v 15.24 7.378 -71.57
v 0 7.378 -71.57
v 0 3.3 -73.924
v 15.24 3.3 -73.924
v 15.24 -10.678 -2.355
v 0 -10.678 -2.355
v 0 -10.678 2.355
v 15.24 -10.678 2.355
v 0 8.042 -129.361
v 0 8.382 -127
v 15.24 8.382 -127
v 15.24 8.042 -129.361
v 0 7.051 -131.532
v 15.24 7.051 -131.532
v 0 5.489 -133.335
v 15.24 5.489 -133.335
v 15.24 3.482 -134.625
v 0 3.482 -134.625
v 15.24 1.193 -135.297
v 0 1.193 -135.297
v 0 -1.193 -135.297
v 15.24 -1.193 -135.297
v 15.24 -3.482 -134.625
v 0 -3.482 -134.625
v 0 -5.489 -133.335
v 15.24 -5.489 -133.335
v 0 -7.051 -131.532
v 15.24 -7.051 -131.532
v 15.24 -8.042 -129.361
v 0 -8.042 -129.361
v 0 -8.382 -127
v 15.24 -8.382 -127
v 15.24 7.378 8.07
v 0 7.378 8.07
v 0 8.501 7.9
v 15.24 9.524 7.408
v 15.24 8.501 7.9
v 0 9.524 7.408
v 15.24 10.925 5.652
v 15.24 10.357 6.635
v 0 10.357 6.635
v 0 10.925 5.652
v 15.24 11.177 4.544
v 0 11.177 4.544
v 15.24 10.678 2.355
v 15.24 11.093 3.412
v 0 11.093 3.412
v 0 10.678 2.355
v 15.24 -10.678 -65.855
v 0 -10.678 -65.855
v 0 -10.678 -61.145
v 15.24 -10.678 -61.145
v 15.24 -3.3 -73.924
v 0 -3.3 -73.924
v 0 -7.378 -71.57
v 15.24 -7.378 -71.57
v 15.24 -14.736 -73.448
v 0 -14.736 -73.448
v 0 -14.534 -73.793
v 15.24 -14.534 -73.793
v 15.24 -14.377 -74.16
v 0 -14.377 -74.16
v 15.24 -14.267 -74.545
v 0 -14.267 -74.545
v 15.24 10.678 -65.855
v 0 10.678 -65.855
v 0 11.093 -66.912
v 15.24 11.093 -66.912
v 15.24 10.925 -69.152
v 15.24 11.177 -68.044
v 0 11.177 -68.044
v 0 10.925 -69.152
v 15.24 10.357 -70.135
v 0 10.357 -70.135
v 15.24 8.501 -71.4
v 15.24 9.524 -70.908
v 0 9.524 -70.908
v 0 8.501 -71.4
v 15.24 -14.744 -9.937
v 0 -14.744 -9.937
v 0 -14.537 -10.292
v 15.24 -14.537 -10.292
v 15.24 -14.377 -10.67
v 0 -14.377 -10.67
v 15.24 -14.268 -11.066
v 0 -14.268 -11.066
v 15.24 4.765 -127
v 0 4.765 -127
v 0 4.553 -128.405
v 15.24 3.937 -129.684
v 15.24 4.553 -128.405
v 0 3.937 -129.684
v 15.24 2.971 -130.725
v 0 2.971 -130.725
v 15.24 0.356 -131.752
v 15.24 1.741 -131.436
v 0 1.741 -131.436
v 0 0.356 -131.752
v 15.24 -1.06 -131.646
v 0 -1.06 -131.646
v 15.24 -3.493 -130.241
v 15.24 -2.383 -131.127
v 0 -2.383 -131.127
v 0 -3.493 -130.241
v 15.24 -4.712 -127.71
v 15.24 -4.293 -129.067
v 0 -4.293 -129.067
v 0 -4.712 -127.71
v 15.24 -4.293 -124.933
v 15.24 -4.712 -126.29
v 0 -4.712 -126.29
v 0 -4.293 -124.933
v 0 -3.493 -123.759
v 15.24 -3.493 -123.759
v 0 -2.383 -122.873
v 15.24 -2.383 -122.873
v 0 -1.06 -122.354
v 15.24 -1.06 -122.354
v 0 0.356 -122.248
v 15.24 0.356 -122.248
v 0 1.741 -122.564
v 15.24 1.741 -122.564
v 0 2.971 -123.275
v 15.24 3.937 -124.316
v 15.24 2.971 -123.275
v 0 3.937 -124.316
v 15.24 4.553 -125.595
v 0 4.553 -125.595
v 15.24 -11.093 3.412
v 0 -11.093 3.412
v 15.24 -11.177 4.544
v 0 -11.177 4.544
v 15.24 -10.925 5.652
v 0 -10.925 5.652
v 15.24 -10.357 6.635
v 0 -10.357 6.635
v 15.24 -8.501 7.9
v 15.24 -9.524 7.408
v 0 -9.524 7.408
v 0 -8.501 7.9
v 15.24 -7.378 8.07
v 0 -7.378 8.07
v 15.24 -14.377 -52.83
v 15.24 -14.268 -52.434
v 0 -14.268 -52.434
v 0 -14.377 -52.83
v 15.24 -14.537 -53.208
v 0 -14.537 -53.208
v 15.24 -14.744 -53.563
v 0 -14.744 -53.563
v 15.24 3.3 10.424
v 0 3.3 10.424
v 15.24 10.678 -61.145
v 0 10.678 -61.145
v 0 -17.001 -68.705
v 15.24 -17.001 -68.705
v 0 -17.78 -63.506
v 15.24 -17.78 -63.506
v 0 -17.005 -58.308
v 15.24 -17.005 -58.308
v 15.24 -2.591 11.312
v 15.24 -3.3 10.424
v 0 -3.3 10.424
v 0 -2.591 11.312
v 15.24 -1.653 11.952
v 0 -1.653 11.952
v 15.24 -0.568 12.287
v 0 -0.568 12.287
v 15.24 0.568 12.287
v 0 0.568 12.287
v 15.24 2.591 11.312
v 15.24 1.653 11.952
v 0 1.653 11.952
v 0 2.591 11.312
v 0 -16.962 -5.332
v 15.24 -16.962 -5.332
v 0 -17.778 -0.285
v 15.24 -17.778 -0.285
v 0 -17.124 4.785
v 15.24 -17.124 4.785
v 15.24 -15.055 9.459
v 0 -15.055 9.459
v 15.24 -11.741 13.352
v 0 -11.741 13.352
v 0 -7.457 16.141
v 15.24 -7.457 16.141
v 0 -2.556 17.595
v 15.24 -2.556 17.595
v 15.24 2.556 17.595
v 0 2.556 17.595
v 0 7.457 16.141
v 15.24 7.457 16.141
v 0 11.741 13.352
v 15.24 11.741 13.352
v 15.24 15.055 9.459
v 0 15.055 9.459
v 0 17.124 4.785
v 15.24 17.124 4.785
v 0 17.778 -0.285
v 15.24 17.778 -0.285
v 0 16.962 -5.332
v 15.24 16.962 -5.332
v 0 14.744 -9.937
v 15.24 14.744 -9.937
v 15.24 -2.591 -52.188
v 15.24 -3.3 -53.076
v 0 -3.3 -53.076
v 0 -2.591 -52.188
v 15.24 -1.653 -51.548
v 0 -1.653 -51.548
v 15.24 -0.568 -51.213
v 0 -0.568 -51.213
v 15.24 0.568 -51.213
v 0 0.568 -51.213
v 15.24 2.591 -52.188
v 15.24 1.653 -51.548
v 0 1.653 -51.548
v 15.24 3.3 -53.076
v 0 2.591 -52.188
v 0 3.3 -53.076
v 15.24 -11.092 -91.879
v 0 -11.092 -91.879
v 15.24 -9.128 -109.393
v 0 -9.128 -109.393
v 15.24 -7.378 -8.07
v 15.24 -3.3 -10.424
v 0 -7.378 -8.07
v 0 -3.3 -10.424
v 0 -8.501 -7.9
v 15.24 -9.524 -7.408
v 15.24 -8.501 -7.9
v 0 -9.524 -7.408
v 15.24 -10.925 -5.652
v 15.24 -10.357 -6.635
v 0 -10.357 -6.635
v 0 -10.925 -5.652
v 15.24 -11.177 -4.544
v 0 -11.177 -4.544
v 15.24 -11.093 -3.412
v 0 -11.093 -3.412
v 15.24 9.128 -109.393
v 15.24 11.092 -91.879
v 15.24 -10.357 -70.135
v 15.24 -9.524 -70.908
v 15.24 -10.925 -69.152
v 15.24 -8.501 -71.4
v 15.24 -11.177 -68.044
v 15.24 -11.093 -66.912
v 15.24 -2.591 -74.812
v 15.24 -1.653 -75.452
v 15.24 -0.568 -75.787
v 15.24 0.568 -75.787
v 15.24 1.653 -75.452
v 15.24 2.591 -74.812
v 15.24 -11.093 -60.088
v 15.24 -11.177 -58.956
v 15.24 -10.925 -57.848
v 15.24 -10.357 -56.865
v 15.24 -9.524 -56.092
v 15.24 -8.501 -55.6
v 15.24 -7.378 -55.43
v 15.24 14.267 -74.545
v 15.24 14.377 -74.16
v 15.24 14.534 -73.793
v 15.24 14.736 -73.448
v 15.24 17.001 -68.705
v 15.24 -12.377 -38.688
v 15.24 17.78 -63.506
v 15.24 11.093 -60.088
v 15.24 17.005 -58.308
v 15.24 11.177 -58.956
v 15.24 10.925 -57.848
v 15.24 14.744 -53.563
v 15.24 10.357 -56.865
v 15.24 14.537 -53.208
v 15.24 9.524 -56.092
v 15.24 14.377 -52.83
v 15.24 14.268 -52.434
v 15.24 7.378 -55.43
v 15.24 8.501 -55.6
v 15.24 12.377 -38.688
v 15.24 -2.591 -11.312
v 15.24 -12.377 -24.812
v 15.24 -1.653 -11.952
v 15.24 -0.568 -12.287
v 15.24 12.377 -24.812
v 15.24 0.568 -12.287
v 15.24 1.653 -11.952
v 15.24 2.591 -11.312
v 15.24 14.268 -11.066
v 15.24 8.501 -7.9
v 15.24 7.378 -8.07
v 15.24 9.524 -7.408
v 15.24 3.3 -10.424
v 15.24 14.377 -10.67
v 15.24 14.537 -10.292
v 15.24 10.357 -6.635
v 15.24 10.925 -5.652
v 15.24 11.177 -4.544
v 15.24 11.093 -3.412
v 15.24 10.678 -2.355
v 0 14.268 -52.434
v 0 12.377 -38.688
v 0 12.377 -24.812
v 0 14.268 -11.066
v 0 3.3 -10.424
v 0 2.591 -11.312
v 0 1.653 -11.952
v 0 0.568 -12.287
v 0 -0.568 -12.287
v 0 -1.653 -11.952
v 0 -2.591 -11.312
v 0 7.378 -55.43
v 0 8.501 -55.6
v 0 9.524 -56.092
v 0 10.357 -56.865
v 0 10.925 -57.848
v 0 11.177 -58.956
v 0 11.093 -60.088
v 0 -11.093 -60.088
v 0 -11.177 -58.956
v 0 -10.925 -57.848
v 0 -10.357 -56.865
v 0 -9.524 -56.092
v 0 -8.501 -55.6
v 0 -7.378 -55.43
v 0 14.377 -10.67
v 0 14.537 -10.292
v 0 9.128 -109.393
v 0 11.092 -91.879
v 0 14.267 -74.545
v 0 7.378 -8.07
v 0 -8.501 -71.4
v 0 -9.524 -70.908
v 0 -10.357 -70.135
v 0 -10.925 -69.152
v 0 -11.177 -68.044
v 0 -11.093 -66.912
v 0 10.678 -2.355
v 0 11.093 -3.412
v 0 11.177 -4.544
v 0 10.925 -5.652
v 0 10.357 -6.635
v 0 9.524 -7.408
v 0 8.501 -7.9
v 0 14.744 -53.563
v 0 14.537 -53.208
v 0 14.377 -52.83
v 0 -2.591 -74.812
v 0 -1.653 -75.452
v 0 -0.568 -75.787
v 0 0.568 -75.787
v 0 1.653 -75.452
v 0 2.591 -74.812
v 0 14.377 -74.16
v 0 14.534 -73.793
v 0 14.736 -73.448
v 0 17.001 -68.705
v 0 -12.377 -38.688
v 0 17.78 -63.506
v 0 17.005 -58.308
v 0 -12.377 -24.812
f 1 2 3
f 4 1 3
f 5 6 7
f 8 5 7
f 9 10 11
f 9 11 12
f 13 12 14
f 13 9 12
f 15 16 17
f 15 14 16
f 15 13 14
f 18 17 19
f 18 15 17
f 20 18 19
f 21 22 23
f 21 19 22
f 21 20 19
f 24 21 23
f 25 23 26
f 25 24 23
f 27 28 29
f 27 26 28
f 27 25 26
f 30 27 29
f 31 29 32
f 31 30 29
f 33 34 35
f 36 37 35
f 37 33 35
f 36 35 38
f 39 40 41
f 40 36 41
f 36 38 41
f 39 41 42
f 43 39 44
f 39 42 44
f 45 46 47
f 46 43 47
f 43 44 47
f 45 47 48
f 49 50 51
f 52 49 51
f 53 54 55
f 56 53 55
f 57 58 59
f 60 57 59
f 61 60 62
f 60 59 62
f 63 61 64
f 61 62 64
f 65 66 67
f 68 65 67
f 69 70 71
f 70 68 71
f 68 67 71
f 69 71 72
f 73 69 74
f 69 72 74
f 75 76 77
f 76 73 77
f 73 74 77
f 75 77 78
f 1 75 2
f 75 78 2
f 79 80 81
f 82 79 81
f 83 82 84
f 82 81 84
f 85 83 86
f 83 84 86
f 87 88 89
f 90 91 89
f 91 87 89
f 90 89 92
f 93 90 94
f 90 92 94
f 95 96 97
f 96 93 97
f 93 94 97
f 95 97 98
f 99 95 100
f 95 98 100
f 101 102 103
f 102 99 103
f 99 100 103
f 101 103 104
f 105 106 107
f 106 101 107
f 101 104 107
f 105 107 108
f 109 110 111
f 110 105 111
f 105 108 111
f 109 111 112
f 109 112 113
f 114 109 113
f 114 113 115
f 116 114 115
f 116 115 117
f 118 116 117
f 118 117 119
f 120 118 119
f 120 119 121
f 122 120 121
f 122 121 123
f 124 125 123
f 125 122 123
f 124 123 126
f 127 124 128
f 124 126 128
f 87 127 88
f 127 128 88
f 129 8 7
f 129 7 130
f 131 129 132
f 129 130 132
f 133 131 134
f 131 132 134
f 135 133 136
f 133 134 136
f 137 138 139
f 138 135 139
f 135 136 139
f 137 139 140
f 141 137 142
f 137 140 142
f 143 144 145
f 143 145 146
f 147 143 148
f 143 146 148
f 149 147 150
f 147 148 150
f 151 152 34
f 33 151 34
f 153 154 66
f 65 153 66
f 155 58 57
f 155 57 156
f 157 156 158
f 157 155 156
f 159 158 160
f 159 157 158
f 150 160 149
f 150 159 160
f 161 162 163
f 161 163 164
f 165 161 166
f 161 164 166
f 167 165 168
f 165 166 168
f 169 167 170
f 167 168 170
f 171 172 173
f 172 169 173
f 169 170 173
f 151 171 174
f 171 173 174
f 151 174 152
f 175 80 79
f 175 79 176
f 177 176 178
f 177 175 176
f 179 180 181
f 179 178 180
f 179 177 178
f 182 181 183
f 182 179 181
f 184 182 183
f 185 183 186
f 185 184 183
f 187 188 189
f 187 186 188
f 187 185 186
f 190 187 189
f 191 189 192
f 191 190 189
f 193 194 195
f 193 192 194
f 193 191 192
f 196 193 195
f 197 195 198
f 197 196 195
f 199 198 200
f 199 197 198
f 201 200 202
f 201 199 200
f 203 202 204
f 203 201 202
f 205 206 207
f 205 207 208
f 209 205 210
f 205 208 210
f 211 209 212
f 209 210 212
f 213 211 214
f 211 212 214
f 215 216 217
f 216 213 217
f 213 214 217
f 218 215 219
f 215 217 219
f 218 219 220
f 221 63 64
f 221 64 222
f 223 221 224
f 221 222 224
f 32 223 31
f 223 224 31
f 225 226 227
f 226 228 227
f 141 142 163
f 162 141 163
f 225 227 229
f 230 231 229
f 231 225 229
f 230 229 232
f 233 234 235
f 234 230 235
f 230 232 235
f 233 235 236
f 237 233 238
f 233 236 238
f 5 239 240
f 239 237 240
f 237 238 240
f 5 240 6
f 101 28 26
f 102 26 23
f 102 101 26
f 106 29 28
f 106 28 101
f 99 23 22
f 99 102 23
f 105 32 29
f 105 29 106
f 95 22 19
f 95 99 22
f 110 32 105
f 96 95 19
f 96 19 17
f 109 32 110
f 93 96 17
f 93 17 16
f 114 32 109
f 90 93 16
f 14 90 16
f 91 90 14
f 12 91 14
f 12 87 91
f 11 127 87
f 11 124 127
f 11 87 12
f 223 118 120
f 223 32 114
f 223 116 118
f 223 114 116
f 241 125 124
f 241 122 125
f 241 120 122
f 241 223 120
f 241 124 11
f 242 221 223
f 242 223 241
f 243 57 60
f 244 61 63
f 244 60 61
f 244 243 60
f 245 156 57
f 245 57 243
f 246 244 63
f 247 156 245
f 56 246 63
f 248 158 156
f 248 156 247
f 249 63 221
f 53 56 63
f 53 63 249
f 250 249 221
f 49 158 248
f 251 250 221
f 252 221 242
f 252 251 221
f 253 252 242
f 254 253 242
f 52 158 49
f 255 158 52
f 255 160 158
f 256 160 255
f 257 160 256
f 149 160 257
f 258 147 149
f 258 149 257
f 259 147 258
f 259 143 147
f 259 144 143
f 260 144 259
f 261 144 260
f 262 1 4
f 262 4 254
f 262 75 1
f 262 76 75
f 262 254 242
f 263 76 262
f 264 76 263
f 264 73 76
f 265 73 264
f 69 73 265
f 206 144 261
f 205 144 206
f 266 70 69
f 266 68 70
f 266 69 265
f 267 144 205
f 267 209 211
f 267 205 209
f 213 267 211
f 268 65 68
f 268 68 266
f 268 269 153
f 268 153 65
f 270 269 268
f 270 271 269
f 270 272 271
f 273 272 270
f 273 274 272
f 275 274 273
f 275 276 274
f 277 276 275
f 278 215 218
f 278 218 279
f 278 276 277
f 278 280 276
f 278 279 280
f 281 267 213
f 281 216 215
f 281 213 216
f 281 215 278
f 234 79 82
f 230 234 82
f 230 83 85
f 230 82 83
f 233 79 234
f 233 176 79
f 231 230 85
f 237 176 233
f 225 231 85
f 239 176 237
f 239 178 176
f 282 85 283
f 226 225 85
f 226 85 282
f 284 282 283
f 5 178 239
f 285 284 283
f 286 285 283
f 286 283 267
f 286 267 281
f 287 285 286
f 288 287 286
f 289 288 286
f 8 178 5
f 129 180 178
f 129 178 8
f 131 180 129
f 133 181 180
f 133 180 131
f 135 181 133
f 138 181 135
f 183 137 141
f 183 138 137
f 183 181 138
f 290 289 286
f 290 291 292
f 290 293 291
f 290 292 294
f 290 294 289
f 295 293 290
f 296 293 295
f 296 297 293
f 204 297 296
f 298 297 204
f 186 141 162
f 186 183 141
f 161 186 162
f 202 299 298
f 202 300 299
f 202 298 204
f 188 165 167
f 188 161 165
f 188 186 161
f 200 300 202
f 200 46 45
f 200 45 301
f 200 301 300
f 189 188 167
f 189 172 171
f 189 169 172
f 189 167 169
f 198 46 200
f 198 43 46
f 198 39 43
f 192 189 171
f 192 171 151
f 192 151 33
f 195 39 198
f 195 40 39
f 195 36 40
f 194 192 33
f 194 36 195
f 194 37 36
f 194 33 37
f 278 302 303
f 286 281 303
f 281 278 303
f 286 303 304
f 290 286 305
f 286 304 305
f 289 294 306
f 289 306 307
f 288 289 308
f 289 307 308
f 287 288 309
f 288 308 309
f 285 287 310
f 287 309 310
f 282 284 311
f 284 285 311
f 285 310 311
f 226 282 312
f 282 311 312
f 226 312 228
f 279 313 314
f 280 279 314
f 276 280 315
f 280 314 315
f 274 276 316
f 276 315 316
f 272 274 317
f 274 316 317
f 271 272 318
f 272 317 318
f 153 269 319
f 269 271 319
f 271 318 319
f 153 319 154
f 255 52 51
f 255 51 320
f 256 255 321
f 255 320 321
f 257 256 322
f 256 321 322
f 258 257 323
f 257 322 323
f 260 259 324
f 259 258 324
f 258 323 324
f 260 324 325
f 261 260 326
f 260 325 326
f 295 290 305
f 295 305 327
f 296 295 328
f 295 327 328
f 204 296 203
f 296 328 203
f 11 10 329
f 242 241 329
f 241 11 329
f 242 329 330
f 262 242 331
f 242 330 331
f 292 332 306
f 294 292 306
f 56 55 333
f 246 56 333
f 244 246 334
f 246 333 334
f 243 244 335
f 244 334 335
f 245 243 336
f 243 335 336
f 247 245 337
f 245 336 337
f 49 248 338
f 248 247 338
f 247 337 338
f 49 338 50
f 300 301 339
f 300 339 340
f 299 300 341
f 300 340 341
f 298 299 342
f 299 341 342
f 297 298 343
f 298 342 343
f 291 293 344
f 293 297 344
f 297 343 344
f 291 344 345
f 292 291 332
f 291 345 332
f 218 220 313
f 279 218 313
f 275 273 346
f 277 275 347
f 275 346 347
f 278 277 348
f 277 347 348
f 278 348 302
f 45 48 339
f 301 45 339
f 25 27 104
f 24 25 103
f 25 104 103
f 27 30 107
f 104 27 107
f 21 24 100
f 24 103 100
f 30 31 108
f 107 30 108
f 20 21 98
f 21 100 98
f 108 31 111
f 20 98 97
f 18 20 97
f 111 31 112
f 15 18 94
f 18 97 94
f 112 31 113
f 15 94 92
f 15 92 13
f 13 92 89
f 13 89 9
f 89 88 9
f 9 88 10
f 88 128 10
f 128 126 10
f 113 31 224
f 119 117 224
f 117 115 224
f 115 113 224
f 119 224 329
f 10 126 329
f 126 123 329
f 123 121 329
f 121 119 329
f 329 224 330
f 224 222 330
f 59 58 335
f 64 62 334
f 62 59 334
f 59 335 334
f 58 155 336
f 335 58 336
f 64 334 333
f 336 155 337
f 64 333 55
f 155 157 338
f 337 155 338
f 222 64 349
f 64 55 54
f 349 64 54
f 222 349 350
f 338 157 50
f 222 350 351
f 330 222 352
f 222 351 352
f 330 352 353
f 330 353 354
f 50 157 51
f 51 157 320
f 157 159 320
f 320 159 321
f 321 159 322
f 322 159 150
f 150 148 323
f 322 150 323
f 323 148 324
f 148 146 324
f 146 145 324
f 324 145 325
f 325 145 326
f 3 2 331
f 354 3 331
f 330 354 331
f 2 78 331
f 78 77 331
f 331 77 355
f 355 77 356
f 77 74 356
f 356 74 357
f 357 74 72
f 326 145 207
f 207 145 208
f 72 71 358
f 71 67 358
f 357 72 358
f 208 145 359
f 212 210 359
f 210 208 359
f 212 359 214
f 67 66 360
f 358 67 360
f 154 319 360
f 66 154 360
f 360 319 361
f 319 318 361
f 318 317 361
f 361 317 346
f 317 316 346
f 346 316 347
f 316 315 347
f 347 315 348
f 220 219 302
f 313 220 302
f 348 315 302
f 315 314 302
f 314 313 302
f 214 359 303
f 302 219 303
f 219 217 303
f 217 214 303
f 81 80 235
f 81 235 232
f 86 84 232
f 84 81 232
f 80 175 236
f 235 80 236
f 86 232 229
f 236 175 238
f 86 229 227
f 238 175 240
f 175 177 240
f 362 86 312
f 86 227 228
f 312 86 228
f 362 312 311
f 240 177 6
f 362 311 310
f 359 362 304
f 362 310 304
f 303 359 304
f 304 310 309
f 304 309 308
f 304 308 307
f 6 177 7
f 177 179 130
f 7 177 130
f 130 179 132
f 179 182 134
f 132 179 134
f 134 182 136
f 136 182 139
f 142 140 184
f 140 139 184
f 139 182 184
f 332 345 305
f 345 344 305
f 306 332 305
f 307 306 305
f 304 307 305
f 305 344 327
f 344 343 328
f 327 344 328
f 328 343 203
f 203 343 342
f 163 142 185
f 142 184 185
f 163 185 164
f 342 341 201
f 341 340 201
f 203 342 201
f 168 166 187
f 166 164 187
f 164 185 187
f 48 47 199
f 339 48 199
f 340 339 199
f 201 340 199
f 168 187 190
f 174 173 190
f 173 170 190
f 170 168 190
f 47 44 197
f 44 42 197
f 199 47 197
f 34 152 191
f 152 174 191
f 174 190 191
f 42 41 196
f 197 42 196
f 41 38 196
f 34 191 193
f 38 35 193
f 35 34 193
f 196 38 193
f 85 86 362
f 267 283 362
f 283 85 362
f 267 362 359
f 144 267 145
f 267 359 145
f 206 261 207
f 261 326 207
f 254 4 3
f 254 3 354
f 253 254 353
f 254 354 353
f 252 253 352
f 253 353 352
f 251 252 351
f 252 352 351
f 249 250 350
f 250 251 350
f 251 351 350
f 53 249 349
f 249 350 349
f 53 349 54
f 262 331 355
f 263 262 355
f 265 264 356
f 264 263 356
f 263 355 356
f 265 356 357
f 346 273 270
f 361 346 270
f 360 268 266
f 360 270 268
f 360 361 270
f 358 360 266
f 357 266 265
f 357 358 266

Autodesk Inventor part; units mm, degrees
ref_plane "YZ Plane" through (0, 0, 0) normal (1, 0, 0) x (0, 1, 0)
ref_plane "XZ Plane" through (0, 0, 0) normal (0, 1, 0) x (-1, 0, 0)
ref_plane "XY Plane" through (0, 0, 0) normal (0, 0, 1) x (1, 0, 0)
sketch "Sketch1" plane through (0, 0, 0) normal (1, 0, 0) x (0, 1, 0)
  arc A0 (14.7437, -9.9374) -> (-14.7437, -9.9374) centre (0, 0) ccw
  arc A1 (-8.382, -127) -> (8.382, -127) centre (0, -127) ccw
  line L0 (-3.2996, -10.4245) -> (-7.3781, -8.0697)
  line L1 (-10.6776, -2.3547) -> (-10.6776, 2.3547)
  line L2 (-7.3781, 8.0697) -> (-3.2996, 10.4245)
  line L3 (3.2996, 10.4245) -> (7.3781, 8.0697)
  line L4 (10.6776, 2.3547) -> (10.6776, -2.3547)
  line L5 (7.3781, -8.0697) -> (3.2996, -10.4245)
  arc A2 (10.6776, 2.3547) -> (7.3781, 8.0697) centre (7.3781, 4.2597) ccw
  arc A3 (7.3781, -8.0697) -> (10.6776, -2.3547) centre (7.3781, -4.2597) ccw
  arc A4 (3.2996, 10.4245) -> (-3.2996, 10.4245) centre (0, 8.5195) ccw
  arc A5 (-7.3781, 8.0697) -> (-10.6776, 2.3547) centre (-7.3781, 4.2597) ccw
  arc A6 (-10.6776, -2.3547) -> (-7.3781, -8.0697) centre (-7.3781, -4.2597) ccw
  arc A7 (-3.2996, -10.4245) -> (3.2996, -10.4245) centre (0, -8.5195) ccw
  line L6 (-3.2996, -73.9245) -> (-7.3781, -71.5697)
  line L7 (-10.6776, -65.8547) -> (-10.6776, -61.1453)
  line L8 (-7.3781, -55.4303) -> (-3.2996, -53.0755)
  line L9 (3.2996, -53.0755) -> (7.3781, -55.4303)
  line L10 (10.6776, -61.1453) -> (10.6776, -65.8547)
  line L11 (7.3781, -71.5697) -> (3.2996, -73.9245)
  arc A8 (10.6776, -61.1453) -> (7.3781, -55.4303) centre (7.3781, -59.2403) ccw
  arc A9 (7.3781, -71.5697) -> (10.6776, -65.8547) centre (7.3781, -67.7597) ccw
  arc A10 (3.2996, -53.0755) -> (-3.2996, -53.0755) centre (0, -54.9805) ccw
  arc A11 (-7.3781, -55.4303) -> (-10.6776, -61.1453) centre (-7.3781, -59.2403) ccw
  arc A12 (-10.6776, -65.8547) -> (-7.3781, -71.5697) centre (-7.3781, -67.7597) ccw
  arc A13 (-3.2996, -73.9245) -> (3.2996, -73.9245) centre (0, -72.0195) ccw
  circle A14 centre (0, -127) radius 4.765
  arc A15 (14.268, -11.0656) -> (14.268, -52.4344) centre (113.7401, -31.75) ccw
  arc A16 (-14.268, -52.4344) -> (-14.268, -11.0656) centre (-113.7401, -31.75) ccw
  arc A17 (14.2667, -74.5446) -> (8.382, -127) centre (262.3746, -128.9362) ccw
  arc A18 (-8.382, -127) -> (-14.2667, -74.5446) centre (-262.3746, -128.9362) ccw
  arc A19 (14.7365, -73.4481) -> (14.7437, -53.5626) centre (0, -63.5) ccw
  arc A20 (-14.7437, -53.5626) -> (-14.7365, -73.4481) centre (0, -63.5) ccw
  arc A21 (14.7365, -73.4481) -> (14.2667, -74.5446) centre (17.368, -75.2245) ccw
  arc A22 (14.268, -52.4344) -> (14.7437, -53.5626) centre (17.3765, -51.788) ccw
  arc A23 (-14.7437, -53.5626) -> (-14.268, -52.4344) centre (-17.3765, -51.788) ccw
  arc A24 (-14.2667, -74.5446) -> (-14.7365, -73.4481) centre (-17.368, -75.2245) ccw
  arc A25 (-14.268, -11.0656) -> (-14.7437, -9.9374) centre (-17.3765, -11.712) ccw
  arc A26 (14.7437, -9.9374) -> (14.268, -11.0656) centre (17.3765, -11.712) ccw
  dimension "d0" = 35.56
  dimension "d21" = 16.764
  dimension "d34" = 9.5301
  dimension "d35" = 101.6
  dimension "d36" = 101.6
  dimension "d37" = 254
  dimension "d38" = 254
  dimension "d39" = 3.175
extrude "Extrusion1" add sketch "Sketch1" along normal blind 15.24
properties part number "Kevin_CAD_test"
